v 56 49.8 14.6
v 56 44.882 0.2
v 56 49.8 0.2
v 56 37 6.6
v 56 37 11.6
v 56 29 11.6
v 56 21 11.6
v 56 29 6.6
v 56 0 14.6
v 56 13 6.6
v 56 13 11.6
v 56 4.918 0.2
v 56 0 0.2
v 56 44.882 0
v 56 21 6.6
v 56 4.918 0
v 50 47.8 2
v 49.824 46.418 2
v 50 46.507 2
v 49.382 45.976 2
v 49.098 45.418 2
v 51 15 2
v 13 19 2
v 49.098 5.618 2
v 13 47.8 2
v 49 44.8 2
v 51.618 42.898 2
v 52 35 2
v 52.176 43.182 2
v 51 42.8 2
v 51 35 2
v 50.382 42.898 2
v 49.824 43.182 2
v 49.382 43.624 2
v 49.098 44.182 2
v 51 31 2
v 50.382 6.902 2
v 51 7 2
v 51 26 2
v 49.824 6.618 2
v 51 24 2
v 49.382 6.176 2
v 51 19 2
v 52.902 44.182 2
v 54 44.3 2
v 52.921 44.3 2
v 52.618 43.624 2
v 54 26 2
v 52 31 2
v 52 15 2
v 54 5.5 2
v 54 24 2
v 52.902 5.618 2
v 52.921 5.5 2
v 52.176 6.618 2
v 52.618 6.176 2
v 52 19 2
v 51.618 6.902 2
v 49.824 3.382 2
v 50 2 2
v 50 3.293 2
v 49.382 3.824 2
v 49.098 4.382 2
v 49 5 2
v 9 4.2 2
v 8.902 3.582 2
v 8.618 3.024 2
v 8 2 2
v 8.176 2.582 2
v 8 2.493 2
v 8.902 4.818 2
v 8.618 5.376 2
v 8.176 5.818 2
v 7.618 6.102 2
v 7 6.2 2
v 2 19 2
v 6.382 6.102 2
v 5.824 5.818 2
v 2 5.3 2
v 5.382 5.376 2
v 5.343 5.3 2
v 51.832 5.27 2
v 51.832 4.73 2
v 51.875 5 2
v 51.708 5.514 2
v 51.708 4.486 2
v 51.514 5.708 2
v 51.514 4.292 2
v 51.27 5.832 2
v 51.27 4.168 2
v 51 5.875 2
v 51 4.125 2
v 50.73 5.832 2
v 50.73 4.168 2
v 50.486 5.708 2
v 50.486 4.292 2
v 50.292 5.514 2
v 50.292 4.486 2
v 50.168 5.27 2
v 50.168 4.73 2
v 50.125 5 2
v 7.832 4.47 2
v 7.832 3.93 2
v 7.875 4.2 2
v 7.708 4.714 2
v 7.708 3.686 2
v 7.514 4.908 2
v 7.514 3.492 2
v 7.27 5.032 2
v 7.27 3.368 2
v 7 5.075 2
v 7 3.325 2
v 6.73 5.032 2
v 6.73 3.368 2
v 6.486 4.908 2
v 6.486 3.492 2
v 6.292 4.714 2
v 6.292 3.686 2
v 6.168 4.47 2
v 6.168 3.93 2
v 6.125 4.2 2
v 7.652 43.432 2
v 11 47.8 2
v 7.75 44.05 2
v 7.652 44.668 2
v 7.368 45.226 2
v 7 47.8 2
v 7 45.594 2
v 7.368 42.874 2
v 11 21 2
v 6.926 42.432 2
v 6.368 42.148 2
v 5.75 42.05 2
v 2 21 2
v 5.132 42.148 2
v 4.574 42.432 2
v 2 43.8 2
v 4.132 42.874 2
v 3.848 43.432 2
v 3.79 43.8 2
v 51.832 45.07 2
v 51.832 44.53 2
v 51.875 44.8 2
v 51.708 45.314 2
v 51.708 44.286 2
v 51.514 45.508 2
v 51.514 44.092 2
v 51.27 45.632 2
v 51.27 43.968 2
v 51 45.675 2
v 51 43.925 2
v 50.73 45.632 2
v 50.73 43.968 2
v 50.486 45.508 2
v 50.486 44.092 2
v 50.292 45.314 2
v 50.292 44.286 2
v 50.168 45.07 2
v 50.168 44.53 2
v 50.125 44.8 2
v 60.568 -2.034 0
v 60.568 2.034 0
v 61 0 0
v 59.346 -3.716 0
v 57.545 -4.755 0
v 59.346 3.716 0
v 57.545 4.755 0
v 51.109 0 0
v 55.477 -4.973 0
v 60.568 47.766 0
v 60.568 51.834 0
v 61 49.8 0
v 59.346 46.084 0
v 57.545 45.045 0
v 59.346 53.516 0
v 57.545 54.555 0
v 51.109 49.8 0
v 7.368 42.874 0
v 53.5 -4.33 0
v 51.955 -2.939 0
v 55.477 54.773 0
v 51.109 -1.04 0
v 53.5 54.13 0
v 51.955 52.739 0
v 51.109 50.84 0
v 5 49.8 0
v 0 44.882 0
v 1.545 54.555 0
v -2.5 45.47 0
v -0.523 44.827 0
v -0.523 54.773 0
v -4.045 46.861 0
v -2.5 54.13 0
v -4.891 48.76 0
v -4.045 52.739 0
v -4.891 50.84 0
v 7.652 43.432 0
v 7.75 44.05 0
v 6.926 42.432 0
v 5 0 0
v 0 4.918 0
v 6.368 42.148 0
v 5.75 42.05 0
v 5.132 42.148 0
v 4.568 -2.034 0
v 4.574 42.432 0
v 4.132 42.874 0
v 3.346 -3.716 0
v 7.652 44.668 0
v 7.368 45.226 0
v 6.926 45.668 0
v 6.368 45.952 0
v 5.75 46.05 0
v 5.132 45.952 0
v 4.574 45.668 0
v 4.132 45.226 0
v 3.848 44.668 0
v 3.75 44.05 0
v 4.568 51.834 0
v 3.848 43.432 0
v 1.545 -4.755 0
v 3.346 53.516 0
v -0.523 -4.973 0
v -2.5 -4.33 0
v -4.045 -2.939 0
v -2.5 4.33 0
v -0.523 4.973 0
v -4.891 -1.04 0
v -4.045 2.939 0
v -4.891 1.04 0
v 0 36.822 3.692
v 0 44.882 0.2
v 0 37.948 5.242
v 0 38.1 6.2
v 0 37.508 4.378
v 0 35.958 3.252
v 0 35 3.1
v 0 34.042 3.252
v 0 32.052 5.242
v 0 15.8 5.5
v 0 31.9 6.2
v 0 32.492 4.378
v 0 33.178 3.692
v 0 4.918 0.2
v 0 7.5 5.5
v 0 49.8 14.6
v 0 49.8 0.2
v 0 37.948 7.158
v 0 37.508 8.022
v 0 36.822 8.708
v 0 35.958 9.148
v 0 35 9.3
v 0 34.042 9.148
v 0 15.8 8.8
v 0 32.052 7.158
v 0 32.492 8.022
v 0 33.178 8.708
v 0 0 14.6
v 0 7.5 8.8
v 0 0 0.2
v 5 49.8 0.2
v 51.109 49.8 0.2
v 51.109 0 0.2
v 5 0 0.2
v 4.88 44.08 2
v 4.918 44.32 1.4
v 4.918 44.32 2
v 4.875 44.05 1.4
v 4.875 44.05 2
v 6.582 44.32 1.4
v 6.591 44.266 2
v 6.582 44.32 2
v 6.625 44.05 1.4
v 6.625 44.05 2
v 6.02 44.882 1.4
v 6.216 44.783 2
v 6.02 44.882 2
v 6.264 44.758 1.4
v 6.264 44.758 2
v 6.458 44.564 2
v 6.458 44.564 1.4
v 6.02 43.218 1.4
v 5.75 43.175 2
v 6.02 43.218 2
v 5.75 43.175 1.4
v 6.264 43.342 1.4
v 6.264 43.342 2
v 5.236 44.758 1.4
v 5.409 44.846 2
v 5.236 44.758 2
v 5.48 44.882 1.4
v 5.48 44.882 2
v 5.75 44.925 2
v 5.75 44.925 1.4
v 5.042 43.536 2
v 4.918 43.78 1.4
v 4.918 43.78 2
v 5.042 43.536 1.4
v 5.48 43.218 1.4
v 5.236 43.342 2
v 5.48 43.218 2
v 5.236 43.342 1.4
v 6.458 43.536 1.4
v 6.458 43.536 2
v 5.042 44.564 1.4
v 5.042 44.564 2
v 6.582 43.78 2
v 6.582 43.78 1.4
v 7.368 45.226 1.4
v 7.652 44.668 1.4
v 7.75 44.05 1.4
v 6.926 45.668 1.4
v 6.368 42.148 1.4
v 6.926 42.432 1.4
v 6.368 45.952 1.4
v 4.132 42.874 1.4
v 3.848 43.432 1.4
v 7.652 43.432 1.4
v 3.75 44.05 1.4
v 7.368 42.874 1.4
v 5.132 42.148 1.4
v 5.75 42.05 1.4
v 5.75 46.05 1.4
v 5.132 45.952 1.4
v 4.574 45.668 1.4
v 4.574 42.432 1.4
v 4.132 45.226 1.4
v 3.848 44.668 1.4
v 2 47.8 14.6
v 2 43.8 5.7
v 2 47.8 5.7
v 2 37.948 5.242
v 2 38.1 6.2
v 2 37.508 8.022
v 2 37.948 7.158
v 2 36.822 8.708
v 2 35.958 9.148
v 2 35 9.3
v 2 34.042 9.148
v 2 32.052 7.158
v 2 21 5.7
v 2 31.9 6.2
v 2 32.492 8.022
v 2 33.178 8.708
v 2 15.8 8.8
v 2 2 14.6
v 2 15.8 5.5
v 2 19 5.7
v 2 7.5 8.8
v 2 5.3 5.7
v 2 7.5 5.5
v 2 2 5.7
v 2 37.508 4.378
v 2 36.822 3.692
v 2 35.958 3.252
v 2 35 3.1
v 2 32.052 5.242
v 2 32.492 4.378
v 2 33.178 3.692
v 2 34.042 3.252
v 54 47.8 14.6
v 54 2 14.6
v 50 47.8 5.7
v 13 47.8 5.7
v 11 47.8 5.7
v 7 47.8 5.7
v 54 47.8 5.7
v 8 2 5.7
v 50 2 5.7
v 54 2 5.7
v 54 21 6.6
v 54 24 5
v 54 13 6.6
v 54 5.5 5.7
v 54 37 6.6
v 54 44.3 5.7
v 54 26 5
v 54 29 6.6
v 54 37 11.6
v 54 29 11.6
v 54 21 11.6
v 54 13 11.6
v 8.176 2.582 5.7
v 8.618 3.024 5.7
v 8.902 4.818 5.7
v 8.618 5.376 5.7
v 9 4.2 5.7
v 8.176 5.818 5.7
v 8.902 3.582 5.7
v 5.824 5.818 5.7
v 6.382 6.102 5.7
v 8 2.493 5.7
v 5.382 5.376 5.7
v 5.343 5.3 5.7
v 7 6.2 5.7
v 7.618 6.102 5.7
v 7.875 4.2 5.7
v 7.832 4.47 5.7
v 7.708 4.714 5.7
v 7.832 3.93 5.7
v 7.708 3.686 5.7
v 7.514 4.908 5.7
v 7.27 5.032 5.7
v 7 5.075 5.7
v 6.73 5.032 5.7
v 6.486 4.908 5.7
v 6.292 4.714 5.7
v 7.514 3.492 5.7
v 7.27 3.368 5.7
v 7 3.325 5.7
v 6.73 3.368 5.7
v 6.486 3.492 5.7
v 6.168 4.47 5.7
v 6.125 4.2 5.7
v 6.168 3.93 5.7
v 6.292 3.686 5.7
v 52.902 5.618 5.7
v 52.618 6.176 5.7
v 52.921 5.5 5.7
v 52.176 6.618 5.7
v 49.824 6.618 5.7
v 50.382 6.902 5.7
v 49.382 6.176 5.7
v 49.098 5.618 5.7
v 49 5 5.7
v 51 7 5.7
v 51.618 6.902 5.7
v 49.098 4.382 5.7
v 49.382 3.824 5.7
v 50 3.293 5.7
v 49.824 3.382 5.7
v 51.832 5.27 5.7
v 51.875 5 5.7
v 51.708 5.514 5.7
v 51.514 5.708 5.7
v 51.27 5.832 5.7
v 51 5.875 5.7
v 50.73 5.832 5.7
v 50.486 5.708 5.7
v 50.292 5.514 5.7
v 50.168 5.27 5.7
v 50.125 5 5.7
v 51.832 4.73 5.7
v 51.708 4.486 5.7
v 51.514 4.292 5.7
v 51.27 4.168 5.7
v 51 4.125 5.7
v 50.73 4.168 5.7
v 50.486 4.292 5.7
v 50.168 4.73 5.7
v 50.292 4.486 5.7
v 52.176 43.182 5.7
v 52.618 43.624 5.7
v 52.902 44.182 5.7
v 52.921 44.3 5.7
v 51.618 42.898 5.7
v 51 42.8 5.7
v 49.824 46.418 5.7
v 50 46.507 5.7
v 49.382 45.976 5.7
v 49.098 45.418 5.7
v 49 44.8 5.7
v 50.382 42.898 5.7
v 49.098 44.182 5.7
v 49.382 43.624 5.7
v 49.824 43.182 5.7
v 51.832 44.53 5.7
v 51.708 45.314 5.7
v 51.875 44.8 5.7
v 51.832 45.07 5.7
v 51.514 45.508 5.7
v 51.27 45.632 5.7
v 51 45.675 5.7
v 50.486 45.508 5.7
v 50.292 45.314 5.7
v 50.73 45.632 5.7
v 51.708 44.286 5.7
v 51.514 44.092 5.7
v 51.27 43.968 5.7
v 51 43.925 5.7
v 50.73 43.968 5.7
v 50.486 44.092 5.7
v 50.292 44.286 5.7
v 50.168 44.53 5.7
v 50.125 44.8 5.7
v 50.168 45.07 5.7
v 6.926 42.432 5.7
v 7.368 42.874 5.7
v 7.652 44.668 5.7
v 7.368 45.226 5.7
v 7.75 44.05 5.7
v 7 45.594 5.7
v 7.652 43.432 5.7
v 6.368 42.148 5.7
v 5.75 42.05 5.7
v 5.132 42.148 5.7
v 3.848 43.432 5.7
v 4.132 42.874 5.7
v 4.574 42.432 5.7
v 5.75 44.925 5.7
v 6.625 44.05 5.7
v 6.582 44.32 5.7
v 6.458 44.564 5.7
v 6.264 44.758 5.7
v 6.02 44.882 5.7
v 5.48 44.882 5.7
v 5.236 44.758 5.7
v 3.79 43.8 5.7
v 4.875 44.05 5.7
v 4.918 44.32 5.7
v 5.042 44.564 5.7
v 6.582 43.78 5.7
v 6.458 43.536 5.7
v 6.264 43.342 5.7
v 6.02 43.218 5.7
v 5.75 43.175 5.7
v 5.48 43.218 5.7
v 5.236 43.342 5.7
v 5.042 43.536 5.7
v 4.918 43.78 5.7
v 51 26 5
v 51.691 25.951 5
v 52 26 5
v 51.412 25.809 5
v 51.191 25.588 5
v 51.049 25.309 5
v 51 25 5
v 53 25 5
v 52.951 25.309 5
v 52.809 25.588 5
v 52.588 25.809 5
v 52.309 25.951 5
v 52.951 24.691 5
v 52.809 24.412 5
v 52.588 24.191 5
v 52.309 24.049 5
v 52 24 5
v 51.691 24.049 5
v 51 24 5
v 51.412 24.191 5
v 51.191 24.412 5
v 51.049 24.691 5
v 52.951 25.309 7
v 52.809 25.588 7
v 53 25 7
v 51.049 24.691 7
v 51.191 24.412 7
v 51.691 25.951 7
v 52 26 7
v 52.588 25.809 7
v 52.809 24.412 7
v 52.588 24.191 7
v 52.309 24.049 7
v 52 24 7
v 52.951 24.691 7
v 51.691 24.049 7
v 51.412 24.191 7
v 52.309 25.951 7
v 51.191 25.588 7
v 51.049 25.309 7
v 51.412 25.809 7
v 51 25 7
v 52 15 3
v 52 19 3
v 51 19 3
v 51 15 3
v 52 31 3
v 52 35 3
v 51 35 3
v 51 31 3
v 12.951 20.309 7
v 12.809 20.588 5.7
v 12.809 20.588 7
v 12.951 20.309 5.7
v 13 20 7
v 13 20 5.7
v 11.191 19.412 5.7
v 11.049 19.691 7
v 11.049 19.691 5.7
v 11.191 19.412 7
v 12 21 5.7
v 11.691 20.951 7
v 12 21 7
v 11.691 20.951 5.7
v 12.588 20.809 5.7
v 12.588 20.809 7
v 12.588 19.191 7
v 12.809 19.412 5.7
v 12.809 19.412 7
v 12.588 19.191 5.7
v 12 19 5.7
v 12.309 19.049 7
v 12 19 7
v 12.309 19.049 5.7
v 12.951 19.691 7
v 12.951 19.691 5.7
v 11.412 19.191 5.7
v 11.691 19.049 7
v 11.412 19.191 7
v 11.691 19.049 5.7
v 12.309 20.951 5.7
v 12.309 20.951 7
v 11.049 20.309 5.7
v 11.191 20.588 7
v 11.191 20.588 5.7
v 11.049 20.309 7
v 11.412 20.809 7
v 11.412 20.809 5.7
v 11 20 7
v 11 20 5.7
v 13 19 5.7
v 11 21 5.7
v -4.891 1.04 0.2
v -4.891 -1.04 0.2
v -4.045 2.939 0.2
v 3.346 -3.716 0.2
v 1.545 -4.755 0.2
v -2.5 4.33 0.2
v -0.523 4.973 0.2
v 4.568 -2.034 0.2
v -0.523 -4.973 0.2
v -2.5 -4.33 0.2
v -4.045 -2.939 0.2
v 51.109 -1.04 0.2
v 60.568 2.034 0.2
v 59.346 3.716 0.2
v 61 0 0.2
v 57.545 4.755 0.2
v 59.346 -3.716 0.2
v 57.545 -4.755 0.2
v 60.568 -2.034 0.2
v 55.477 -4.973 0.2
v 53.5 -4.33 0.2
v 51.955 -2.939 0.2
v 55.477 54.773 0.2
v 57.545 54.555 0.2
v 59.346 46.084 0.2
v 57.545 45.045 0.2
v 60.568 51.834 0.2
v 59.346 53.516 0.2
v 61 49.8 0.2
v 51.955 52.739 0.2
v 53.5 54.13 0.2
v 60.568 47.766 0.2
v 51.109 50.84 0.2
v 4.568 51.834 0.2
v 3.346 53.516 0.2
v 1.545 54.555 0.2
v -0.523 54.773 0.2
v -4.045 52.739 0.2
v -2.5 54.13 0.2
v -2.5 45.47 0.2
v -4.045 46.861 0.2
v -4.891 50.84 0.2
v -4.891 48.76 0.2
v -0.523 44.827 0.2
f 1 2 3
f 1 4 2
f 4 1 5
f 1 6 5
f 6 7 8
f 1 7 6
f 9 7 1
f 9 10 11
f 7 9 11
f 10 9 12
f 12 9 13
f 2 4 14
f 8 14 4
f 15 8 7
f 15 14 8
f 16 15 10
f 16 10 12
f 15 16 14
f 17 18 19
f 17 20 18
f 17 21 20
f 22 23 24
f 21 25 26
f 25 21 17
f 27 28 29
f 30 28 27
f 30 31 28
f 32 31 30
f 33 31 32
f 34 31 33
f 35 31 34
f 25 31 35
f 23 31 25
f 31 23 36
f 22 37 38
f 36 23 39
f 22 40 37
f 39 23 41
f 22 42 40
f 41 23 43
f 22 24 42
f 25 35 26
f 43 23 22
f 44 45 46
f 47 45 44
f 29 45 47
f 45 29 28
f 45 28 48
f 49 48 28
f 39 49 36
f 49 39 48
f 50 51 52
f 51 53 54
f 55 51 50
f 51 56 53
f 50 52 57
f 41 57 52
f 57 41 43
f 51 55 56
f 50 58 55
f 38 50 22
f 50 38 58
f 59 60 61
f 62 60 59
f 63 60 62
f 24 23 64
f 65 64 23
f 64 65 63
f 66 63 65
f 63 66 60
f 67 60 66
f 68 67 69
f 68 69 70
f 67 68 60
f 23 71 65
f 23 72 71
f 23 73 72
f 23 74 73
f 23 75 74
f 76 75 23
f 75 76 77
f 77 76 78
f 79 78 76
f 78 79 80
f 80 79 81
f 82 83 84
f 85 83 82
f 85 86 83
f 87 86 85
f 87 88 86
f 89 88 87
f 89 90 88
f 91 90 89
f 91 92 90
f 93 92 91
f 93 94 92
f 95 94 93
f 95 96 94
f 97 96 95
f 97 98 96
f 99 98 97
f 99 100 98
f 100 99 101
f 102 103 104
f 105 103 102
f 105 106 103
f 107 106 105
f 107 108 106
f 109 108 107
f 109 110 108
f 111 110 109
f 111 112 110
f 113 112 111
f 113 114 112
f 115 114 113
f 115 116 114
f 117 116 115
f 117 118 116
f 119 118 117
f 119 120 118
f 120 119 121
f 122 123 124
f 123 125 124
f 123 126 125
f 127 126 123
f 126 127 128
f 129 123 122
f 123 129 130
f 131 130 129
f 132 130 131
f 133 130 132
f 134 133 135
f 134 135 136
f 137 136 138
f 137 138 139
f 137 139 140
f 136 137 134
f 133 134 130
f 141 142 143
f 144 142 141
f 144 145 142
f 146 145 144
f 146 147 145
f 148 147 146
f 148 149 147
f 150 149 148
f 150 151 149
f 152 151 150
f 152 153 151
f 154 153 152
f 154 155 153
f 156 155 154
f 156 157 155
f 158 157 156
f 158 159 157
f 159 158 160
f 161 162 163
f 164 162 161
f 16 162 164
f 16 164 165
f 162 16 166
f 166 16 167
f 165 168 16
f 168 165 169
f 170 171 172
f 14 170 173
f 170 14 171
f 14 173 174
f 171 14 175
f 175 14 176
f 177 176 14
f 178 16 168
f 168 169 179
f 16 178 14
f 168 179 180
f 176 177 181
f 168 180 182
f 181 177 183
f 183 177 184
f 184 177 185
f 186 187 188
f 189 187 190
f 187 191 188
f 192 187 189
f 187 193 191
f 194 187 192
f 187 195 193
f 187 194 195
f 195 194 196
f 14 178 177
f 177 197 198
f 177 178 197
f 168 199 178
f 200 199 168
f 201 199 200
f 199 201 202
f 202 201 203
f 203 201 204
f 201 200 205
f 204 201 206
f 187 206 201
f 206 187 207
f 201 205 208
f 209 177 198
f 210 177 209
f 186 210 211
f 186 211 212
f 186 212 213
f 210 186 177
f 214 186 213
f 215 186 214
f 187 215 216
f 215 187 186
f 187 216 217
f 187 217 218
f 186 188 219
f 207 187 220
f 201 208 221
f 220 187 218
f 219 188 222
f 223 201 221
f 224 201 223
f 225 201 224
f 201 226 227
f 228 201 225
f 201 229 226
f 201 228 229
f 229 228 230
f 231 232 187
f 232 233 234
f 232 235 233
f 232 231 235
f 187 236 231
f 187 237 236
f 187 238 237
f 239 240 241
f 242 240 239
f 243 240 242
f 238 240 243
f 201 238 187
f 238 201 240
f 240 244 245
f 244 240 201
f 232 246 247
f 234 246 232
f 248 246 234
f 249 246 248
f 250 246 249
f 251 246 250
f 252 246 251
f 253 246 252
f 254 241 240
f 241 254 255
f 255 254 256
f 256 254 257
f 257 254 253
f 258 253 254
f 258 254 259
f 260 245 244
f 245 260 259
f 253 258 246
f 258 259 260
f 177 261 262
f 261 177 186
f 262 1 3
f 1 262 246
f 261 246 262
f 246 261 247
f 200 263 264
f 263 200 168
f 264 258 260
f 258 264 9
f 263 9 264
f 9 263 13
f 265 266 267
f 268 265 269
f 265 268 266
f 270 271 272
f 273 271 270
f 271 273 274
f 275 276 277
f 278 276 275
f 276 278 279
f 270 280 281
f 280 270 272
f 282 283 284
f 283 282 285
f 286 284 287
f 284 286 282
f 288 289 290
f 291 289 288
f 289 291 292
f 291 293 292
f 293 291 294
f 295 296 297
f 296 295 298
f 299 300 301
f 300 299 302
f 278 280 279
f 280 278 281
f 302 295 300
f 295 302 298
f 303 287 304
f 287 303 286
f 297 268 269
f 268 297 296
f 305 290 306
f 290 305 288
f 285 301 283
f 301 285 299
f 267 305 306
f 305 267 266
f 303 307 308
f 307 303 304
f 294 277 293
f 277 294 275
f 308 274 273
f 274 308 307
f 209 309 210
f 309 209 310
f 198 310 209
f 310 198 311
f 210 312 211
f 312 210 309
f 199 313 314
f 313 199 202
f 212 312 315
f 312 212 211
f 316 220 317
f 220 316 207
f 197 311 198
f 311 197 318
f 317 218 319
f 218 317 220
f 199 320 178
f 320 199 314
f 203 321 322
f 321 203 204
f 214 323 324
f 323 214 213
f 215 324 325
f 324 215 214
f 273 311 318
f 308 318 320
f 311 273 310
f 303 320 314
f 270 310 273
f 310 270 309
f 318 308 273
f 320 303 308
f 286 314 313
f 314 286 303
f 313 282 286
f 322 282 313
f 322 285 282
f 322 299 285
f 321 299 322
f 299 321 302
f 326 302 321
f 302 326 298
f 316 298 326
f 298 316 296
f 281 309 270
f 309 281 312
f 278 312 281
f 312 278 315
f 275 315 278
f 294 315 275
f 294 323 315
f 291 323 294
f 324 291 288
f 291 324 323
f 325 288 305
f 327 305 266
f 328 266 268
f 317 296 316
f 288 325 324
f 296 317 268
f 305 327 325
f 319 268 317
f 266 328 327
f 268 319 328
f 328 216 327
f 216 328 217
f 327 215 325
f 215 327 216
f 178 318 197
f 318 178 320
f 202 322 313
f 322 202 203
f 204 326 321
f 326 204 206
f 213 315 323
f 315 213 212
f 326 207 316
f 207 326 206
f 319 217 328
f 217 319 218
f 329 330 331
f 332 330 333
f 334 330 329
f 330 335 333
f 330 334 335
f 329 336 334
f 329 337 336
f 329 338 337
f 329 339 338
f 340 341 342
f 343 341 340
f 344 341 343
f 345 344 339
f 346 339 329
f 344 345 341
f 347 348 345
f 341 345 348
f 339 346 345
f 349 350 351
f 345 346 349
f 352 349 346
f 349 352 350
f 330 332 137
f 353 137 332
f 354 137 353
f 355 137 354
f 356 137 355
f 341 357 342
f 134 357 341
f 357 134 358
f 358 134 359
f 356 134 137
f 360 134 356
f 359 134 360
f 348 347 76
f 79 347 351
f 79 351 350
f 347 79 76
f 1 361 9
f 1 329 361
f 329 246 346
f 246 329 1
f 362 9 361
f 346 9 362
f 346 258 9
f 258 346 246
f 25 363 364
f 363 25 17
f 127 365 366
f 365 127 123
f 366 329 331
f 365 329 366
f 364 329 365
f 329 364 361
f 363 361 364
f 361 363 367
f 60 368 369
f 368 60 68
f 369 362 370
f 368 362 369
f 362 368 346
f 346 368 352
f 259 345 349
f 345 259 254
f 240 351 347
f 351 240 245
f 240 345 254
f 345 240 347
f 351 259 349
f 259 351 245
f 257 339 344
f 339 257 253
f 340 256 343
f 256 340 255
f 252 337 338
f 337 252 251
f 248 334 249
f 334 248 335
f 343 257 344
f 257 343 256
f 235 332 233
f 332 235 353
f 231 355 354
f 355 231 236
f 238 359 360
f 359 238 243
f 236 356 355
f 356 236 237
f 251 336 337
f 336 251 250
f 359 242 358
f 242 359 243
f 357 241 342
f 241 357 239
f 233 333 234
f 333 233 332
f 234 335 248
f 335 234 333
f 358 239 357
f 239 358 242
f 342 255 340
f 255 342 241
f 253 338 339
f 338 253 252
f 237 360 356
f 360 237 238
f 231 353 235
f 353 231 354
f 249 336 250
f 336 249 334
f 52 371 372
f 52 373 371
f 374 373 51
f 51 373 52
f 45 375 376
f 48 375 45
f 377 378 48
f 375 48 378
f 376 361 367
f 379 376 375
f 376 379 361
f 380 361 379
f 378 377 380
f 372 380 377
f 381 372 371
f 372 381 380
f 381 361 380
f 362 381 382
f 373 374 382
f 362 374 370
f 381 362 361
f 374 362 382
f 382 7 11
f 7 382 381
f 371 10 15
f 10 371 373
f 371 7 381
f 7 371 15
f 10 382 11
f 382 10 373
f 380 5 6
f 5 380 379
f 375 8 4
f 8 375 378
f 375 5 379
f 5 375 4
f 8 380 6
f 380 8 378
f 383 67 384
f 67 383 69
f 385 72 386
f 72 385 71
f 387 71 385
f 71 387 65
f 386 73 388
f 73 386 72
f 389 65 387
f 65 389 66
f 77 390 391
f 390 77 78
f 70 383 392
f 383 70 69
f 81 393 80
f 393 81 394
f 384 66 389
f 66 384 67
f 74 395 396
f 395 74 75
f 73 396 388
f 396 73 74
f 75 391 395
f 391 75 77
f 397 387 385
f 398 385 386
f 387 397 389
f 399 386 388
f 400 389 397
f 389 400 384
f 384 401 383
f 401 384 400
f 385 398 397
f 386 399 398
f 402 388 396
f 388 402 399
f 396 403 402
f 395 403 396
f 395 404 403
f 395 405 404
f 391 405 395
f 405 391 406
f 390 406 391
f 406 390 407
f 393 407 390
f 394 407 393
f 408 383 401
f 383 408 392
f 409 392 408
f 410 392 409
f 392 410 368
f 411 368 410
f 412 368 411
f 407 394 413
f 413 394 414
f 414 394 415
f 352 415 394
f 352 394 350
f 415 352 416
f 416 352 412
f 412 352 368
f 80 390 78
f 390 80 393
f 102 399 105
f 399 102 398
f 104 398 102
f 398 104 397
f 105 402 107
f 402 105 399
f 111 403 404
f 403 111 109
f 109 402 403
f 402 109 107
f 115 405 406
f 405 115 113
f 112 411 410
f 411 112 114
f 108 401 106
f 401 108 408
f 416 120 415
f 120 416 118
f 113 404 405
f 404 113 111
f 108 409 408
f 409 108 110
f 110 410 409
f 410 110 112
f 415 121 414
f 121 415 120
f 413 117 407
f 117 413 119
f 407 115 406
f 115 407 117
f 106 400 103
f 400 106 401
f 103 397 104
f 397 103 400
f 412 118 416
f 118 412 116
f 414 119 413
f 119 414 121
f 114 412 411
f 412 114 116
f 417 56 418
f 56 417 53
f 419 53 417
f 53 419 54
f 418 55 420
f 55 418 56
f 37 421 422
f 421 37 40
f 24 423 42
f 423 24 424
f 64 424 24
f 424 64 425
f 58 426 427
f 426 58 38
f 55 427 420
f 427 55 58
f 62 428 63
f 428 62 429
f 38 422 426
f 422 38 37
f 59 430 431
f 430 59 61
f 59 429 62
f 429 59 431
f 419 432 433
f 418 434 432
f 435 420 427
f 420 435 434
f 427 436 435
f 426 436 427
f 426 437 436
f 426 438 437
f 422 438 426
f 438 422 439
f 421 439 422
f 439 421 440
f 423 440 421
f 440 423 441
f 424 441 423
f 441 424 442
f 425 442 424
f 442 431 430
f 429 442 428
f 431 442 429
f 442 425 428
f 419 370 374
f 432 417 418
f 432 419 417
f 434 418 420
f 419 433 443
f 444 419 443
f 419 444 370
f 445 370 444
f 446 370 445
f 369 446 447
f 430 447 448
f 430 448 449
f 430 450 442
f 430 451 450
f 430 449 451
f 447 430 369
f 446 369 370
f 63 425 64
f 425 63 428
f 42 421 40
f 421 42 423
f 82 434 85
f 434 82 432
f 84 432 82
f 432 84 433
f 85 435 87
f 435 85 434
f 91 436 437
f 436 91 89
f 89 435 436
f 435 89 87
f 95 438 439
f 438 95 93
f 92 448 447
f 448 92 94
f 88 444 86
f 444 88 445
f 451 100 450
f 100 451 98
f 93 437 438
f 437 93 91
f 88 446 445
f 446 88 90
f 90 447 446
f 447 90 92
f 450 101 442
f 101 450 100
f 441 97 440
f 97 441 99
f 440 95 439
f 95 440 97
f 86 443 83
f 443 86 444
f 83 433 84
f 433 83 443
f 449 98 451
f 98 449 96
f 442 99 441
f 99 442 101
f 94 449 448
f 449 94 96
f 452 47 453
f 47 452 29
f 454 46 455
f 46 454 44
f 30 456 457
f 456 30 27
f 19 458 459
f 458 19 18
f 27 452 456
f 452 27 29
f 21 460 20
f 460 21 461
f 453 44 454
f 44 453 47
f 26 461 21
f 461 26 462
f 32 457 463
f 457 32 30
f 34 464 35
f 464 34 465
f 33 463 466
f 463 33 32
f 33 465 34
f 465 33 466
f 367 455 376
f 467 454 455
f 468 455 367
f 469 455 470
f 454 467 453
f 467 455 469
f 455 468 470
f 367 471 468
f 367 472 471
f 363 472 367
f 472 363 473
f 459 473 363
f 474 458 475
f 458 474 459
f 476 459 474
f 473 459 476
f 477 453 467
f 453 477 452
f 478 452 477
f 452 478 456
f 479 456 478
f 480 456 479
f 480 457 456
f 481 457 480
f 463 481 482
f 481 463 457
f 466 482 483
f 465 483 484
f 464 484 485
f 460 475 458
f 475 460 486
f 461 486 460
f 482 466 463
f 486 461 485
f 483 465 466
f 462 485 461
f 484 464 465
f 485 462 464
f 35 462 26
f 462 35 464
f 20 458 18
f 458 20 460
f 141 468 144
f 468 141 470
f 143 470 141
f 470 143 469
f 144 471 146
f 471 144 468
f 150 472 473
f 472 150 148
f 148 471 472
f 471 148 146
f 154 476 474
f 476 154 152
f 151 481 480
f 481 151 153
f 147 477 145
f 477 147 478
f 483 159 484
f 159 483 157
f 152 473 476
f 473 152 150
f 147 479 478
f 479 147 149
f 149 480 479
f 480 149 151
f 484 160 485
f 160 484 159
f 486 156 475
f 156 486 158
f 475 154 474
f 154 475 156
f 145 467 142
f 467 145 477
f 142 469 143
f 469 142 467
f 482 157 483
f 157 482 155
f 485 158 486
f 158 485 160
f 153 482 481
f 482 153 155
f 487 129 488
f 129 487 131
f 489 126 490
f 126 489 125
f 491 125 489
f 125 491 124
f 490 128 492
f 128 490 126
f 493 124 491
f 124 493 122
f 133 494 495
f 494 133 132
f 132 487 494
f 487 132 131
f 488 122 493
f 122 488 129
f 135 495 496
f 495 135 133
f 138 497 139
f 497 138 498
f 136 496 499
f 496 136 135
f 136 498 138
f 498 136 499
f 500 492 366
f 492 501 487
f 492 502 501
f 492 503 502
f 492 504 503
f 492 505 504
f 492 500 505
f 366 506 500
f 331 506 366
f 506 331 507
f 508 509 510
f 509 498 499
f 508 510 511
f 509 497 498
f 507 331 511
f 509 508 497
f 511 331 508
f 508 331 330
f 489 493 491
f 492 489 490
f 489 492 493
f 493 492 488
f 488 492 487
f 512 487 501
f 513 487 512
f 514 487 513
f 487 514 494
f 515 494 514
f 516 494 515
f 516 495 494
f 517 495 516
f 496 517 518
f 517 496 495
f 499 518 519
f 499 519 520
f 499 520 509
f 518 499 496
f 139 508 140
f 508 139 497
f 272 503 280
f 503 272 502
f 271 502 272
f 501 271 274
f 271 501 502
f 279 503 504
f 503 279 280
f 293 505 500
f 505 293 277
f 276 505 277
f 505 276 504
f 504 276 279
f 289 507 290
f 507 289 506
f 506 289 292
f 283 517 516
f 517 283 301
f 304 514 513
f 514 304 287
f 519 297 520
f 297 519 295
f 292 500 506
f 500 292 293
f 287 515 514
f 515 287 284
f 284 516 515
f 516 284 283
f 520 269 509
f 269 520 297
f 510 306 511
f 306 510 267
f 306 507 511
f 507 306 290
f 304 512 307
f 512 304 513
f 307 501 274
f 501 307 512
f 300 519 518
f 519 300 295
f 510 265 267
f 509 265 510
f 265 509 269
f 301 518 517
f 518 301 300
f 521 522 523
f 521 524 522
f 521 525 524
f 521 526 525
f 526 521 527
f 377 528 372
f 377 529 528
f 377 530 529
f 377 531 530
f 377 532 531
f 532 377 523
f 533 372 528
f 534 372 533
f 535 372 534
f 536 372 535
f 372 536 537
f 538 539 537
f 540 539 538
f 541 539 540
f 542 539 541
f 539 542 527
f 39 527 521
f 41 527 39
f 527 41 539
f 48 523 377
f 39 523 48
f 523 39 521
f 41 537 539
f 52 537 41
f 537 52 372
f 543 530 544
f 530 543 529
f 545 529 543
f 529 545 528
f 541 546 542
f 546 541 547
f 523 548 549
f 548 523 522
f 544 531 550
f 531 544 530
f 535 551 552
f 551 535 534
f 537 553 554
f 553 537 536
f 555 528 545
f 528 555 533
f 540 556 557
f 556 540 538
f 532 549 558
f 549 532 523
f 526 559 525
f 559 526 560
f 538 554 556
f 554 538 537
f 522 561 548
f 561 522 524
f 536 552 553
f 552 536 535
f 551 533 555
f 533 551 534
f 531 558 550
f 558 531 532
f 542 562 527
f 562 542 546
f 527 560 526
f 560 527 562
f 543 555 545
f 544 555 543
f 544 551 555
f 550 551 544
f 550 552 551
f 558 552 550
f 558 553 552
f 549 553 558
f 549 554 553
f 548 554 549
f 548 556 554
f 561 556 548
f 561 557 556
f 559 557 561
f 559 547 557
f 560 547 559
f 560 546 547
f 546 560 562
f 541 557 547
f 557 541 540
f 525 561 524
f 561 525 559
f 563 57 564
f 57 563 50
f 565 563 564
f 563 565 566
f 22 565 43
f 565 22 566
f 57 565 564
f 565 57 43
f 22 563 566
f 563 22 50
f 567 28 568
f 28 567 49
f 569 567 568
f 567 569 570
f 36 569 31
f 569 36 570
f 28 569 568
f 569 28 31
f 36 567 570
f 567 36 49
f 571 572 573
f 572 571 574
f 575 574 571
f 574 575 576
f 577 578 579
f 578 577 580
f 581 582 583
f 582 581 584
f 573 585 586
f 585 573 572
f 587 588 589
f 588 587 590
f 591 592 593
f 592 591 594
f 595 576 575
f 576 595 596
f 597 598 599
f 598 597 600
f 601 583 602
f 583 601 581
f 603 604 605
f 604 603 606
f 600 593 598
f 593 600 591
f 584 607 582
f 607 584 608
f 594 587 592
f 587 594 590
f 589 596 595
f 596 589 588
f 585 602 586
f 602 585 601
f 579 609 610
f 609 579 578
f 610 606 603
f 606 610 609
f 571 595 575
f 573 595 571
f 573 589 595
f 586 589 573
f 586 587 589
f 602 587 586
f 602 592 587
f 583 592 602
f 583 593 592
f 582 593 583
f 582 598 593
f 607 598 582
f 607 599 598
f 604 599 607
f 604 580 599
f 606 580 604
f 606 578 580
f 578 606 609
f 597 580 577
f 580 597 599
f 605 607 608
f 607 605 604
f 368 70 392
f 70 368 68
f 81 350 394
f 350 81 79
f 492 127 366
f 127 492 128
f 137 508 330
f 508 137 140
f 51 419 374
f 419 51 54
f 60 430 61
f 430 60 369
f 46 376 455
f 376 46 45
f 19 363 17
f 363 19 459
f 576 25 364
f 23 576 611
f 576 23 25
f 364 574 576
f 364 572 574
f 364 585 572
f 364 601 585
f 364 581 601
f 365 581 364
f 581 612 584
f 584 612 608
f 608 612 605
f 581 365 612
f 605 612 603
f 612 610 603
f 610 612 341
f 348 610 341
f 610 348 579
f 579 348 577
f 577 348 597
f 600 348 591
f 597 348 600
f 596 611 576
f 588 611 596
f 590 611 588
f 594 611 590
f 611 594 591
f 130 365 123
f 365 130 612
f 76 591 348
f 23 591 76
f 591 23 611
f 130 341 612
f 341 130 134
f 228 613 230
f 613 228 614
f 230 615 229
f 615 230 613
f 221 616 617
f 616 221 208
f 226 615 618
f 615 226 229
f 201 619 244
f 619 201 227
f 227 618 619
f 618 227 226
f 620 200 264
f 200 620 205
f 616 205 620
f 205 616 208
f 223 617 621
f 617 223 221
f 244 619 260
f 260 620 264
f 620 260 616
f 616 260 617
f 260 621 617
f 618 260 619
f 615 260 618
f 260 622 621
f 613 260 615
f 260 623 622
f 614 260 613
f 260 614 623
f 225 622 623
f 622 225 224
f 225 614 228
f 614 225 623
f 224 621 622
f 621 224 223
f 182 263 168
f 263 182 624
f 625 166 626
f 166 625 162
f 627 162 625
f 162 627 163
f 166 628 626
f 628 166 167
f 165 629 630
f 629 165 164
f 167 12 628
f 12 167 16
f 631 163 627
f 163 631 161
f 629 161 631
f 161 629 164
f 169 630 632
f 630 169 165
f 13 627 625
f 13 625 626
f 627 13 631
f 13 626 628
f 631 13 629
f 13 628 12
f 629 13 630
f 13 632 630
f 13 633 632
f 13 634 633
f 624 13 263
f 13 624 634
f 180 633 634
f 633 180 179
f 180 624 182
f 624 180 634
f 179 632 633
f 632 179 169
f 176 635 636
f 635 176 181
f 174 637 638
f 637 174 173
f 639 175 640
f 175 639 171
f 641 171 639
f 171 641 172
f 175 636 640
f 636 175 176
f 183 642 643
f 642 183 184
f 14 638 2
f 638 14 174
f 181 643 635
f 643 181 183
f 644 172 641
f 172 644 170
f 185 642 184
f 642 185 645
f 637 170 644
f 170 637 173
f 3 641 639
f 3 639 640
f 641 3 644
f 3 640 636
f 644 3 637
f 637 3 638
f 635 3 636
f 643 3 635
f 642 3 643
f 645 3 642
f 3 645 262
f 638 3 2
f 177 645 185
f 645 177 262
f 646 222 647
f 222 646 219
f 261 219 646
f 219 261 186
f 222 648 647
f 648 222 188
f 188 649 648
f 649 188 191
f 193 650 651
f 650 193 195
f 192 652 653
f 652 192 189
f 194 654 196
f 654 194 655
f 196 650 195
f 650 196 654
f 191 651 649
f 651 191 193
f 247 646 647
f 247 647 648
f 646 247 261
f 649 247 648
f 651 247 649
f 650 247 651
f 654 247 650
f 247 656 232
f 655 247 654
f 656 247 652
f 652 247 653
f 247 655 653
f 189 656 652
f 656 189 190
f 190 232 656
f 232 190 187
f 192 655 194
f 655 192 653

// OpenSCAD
bat_width = 25.1;
bat_height = 42.1;
bat_depth = 4.1;
pcb_width_1 = 51.4;
pcb_width_2 = 44;
pcb_width_3 = 39.6;
pcb_height_1 = 13.7;
pcb_height_2 = 30.4;
pcb_height_3 = 45.4;
pcb_depth = 3.2;
usb_height = 7.5;
usb_offset_x = 2.5; // how much micro usb protrudes from pcb
usb_offset_y = 5.3; // how much micro usb is away from pcb bottom
sma_diameter = 6.2;
wall_size = 2;
hole_dist_x = 45.3;
hole_dist_y = 41.2;
hole_size = 1.6;
hole_offset_y = 1.3;
hole_offset_x = 3.8;
case_width = 56;
case_height = 49.8;
case_depth = 12.6;
but_width = 8;
but_height = 5;
but_offset_z = 3;
but_offset_y = 13;
but_dist = 8;
but_help_dia = 1.2;
but_help_height = 5;
but_help_dist = 3.0;
usb_cut_w = 8.3;
usb_cut_h = 3.3;
usb_cut_off_y = 7.5;
usb_cut_off_z = 5.5;
nub_off_y = 21;
nub_off_x = 13;
hole_dia = 1.75;
hole_outer = 4;
hole_height = 3.7;
helper_discs = 10;

module battery() {
    cube([bat_width, bat_height, bat_depth]);
}

module pcb() {
    difference() {
        union() {
            translate([pcb_width_1 - 39.6 + usb_offset_x, 0, 0])
                cube([pcb_width_3, pcb_height_3, pcb_depth]);
            
            translate([pcb_width_1 - pcb_width_2 + usb_offset_x, 0, 0])
                cube([pcb_width_2, pcb_height_2, pcb_depth]);
            
            translate([usb_offset_x, 0, 0])
                cube([pcb_width_1, pcb_height_1, pcb_depth]);
            
            translate([0, usb_offset_y, 0])
                cube([usb_offset_x, usb_height, pcb_depth]);
        }
        
        translate([usb_offset_x + hole_offset_x + (hole_size / 2), hole_offset_y + (hole_size / 2), -1])
        union() {
            cylinder(d = hole_size, h = pcb_depth + 2, $fn = 20);
            
            translate([hole_dist_x - hole_size, 0, 0])
                cylinder(d = hole_size, h = pcb_depth + 2, $fn = 20);
            
            translate([hole_dist_x - hole_size, hole_dist_y - hole_size, 0])
                cylinder(d = hole_size, h = pcb_depth + 2, $fn = 20);
        }
    }
}

module top() {
    translate([((usb_offset_x + pcb_width_1) - bat_width) / 2, 0, 0])
        battery();
    
    translate([0, 0, bat_depth])
        pcb();
}

module sma() {
    translate([0, 0, -5])
        cylinder(d = 3, h = 5, $fn = 20);
    
    cylinder(d = 9.1, h = 3.5, $fn = 6);
    
    translate([0, 0, 3.5])
        cylinder(d = sma_diameter, h = 10, $fn = 20);
    
    translate([0, 0, 3.5 + 2.5])
        cylinder(d = 9.3, h = 2.5, $fn = 20);
}

module screwholder() {
    difference() {
        cylinder(d = hole_outer, h = hole_height, $fn = 20);
        translate([0, 0, -1])
            cylinder(d = hole_dia, h = hole_height + 2, $fn = 20);
    }
}

module case() {
    difference() {
        // floor
        cube([case_width, case_height, wall_size]);
        
        translate([5.75, case_height - 5.75, -1])
            cylinder(d = hole_dia, h = wall_size + 2, $fn = 20);
        
        translate([5.75, case_height - 5.75, -1])
            cylinder(d = hole_outer, h = 1 + 1.4, $fn = 20);
    }
    
    // bottom
    translate([0, 0, wall_size])
        cube([case_width, wall_size, case_depth]);
    
    // top
    translate([0, case_height - wall_size, wall_size])
        cube([case_width, wall_size, case_depth]);
    
    difference() {
        // left
        translate([0, wall_size, wall_size])
            cube([wall_size, case_height - (2 * wall_size), case_depth]);
        
        // usb charge port
        translate([-1, usb_cut_off_y, usb_cut_off_z])
            cube([wall_size + 2, usb_cut_w, usb_cut_h]);
        
        translate([wall_size + 1, 35, wall_size + sma_diameter - 2])
            rotate([0, -90, 0])
            cylinder(d = sma_diameter, h = wall_size + 2, $fn = 20);
    }
    
    difference() {
        // right
        translate([case_width - wall_size, wall_size, wall_size])
            cube([wall_size, case_height - (2 * wall_size), case_depth]);
        
        // first (CH) button
        translate([case_width - wall_size - 1, but_offset_y, wall_size + case_depth - but_offset_z - but_height])
            cube([wall_size + 2, but_width, but_height]);
        
        // second (Pow) button
        translate([case_width - wall_size - 1, but_offset_y + but_width + but_dist, wall_size + case_depth - but_offset_z - but_height])
            cube([wall_size + 2, but_width, but_height]);
    }
    
    // button helper
    translate([case_width - wall_size - but_help_dist, but_offset_y + but_width + (but_dist / 2) - (wall_size / 2), wall_size])
        cube([but_help_dist, wall_size, but_help_height - wall_size]);
    translate([case_width - wall_size - but_help_dist + (wall_size / 2), but_offset_y + but_width + (but_dist / 2), wall_size])
        cylinder(d = wall_size, h = but_help_height, $fn = 20);
    translate([case_width - wall_size - but_help_dist, but_offset_y + (but_width / 2) - wall_size, wall_size])
        cube([wall_size / 2, wall_size * 2, wall_size / 2]);
    translate([case_width - wall_size - but_help_dist, but_offset_y + (but_width / 2) - wall_size + but_width + but_dist, wall_size])
        cube([wall_size / 2, wall_size * 2, wall_size / 2]);
    translate([nub_off_x - (wall_size / 2), nub_off_y - (wall_size / 2), wall_size])
        cylinder(d = wall_size, h = but_help_height, $fn = 20);
    
    translate([7, 4.2, wall_size])
        screwholder();
    
    translate([case_width - 5, 5, wall_size])
        screwholder();
    
    translate([case_width - 5, case_height - 5, wall_size])
        screwholder();
    
    translate([5.75, case_height - 5.75, wall_size])
        screwholder();
    
    // helper walls for screw holders
    translate([4, 0, wall_size])
        cube([wall_size + 2, 3, hole_height]);
    translate([0, 0, wall_size])
        cube([6, wall_size + 3.3, hole_height]);
    translate([3, case_height - 4.5, wall_size])
        cube([wall_size + 2, 3, hole_height]);
    translate([0, case_height - 6, wall_size])
        cube([4.5, wall_size + 3, hole_height]);
    translate([case_width - 4, 0, wall_size])
        cube([wall_size + 2, 5.5, hole_height]);
    translate([case_width - 6, 0, wall_size])
        cube([4, wall_size + 2, hole_height]);
    translate([case_width - 4, case_height - 5.5, wall_size])
        cube([wall_size + 2, 5.5, hole_height]);
    translate([case_width - 6, case_height - 4, wall_size])
        cube([4, wall_size + 2, hole_height]);
    translate([nub_off_x - wall_size, nub_off_y - wall_size, wall_size])
        cube([wall_size, case_height - nub_off_y, hole_height]);
    translate([wall_size, nub_off_y - wall_size, wall_size])
        cube([nub_off_x - wall_size, wall_size, hole_height]);
        
    cylinder(d = helper_discs, h = 0.2, $fn = 15);
    translate([case_width, 0, 0])
        cylinder(d = helper_discs, h = 0.2, $fn = 15);
    translate([case_width, case_height, 0])
        cylinder(d = helper_discs, h = 0.2, $fn = 15);
    translate([0, case_height, 0])
        cylinder(d = helper_discs, h = 0.2, $fn = 15);
}

case();

%translate([0, wall_size, wall_size - 0.4])
    top();

%translate([5.5, 35, wall_size + sma_diameter - 2])
    rotate([0, -90, 0])
    sma();
